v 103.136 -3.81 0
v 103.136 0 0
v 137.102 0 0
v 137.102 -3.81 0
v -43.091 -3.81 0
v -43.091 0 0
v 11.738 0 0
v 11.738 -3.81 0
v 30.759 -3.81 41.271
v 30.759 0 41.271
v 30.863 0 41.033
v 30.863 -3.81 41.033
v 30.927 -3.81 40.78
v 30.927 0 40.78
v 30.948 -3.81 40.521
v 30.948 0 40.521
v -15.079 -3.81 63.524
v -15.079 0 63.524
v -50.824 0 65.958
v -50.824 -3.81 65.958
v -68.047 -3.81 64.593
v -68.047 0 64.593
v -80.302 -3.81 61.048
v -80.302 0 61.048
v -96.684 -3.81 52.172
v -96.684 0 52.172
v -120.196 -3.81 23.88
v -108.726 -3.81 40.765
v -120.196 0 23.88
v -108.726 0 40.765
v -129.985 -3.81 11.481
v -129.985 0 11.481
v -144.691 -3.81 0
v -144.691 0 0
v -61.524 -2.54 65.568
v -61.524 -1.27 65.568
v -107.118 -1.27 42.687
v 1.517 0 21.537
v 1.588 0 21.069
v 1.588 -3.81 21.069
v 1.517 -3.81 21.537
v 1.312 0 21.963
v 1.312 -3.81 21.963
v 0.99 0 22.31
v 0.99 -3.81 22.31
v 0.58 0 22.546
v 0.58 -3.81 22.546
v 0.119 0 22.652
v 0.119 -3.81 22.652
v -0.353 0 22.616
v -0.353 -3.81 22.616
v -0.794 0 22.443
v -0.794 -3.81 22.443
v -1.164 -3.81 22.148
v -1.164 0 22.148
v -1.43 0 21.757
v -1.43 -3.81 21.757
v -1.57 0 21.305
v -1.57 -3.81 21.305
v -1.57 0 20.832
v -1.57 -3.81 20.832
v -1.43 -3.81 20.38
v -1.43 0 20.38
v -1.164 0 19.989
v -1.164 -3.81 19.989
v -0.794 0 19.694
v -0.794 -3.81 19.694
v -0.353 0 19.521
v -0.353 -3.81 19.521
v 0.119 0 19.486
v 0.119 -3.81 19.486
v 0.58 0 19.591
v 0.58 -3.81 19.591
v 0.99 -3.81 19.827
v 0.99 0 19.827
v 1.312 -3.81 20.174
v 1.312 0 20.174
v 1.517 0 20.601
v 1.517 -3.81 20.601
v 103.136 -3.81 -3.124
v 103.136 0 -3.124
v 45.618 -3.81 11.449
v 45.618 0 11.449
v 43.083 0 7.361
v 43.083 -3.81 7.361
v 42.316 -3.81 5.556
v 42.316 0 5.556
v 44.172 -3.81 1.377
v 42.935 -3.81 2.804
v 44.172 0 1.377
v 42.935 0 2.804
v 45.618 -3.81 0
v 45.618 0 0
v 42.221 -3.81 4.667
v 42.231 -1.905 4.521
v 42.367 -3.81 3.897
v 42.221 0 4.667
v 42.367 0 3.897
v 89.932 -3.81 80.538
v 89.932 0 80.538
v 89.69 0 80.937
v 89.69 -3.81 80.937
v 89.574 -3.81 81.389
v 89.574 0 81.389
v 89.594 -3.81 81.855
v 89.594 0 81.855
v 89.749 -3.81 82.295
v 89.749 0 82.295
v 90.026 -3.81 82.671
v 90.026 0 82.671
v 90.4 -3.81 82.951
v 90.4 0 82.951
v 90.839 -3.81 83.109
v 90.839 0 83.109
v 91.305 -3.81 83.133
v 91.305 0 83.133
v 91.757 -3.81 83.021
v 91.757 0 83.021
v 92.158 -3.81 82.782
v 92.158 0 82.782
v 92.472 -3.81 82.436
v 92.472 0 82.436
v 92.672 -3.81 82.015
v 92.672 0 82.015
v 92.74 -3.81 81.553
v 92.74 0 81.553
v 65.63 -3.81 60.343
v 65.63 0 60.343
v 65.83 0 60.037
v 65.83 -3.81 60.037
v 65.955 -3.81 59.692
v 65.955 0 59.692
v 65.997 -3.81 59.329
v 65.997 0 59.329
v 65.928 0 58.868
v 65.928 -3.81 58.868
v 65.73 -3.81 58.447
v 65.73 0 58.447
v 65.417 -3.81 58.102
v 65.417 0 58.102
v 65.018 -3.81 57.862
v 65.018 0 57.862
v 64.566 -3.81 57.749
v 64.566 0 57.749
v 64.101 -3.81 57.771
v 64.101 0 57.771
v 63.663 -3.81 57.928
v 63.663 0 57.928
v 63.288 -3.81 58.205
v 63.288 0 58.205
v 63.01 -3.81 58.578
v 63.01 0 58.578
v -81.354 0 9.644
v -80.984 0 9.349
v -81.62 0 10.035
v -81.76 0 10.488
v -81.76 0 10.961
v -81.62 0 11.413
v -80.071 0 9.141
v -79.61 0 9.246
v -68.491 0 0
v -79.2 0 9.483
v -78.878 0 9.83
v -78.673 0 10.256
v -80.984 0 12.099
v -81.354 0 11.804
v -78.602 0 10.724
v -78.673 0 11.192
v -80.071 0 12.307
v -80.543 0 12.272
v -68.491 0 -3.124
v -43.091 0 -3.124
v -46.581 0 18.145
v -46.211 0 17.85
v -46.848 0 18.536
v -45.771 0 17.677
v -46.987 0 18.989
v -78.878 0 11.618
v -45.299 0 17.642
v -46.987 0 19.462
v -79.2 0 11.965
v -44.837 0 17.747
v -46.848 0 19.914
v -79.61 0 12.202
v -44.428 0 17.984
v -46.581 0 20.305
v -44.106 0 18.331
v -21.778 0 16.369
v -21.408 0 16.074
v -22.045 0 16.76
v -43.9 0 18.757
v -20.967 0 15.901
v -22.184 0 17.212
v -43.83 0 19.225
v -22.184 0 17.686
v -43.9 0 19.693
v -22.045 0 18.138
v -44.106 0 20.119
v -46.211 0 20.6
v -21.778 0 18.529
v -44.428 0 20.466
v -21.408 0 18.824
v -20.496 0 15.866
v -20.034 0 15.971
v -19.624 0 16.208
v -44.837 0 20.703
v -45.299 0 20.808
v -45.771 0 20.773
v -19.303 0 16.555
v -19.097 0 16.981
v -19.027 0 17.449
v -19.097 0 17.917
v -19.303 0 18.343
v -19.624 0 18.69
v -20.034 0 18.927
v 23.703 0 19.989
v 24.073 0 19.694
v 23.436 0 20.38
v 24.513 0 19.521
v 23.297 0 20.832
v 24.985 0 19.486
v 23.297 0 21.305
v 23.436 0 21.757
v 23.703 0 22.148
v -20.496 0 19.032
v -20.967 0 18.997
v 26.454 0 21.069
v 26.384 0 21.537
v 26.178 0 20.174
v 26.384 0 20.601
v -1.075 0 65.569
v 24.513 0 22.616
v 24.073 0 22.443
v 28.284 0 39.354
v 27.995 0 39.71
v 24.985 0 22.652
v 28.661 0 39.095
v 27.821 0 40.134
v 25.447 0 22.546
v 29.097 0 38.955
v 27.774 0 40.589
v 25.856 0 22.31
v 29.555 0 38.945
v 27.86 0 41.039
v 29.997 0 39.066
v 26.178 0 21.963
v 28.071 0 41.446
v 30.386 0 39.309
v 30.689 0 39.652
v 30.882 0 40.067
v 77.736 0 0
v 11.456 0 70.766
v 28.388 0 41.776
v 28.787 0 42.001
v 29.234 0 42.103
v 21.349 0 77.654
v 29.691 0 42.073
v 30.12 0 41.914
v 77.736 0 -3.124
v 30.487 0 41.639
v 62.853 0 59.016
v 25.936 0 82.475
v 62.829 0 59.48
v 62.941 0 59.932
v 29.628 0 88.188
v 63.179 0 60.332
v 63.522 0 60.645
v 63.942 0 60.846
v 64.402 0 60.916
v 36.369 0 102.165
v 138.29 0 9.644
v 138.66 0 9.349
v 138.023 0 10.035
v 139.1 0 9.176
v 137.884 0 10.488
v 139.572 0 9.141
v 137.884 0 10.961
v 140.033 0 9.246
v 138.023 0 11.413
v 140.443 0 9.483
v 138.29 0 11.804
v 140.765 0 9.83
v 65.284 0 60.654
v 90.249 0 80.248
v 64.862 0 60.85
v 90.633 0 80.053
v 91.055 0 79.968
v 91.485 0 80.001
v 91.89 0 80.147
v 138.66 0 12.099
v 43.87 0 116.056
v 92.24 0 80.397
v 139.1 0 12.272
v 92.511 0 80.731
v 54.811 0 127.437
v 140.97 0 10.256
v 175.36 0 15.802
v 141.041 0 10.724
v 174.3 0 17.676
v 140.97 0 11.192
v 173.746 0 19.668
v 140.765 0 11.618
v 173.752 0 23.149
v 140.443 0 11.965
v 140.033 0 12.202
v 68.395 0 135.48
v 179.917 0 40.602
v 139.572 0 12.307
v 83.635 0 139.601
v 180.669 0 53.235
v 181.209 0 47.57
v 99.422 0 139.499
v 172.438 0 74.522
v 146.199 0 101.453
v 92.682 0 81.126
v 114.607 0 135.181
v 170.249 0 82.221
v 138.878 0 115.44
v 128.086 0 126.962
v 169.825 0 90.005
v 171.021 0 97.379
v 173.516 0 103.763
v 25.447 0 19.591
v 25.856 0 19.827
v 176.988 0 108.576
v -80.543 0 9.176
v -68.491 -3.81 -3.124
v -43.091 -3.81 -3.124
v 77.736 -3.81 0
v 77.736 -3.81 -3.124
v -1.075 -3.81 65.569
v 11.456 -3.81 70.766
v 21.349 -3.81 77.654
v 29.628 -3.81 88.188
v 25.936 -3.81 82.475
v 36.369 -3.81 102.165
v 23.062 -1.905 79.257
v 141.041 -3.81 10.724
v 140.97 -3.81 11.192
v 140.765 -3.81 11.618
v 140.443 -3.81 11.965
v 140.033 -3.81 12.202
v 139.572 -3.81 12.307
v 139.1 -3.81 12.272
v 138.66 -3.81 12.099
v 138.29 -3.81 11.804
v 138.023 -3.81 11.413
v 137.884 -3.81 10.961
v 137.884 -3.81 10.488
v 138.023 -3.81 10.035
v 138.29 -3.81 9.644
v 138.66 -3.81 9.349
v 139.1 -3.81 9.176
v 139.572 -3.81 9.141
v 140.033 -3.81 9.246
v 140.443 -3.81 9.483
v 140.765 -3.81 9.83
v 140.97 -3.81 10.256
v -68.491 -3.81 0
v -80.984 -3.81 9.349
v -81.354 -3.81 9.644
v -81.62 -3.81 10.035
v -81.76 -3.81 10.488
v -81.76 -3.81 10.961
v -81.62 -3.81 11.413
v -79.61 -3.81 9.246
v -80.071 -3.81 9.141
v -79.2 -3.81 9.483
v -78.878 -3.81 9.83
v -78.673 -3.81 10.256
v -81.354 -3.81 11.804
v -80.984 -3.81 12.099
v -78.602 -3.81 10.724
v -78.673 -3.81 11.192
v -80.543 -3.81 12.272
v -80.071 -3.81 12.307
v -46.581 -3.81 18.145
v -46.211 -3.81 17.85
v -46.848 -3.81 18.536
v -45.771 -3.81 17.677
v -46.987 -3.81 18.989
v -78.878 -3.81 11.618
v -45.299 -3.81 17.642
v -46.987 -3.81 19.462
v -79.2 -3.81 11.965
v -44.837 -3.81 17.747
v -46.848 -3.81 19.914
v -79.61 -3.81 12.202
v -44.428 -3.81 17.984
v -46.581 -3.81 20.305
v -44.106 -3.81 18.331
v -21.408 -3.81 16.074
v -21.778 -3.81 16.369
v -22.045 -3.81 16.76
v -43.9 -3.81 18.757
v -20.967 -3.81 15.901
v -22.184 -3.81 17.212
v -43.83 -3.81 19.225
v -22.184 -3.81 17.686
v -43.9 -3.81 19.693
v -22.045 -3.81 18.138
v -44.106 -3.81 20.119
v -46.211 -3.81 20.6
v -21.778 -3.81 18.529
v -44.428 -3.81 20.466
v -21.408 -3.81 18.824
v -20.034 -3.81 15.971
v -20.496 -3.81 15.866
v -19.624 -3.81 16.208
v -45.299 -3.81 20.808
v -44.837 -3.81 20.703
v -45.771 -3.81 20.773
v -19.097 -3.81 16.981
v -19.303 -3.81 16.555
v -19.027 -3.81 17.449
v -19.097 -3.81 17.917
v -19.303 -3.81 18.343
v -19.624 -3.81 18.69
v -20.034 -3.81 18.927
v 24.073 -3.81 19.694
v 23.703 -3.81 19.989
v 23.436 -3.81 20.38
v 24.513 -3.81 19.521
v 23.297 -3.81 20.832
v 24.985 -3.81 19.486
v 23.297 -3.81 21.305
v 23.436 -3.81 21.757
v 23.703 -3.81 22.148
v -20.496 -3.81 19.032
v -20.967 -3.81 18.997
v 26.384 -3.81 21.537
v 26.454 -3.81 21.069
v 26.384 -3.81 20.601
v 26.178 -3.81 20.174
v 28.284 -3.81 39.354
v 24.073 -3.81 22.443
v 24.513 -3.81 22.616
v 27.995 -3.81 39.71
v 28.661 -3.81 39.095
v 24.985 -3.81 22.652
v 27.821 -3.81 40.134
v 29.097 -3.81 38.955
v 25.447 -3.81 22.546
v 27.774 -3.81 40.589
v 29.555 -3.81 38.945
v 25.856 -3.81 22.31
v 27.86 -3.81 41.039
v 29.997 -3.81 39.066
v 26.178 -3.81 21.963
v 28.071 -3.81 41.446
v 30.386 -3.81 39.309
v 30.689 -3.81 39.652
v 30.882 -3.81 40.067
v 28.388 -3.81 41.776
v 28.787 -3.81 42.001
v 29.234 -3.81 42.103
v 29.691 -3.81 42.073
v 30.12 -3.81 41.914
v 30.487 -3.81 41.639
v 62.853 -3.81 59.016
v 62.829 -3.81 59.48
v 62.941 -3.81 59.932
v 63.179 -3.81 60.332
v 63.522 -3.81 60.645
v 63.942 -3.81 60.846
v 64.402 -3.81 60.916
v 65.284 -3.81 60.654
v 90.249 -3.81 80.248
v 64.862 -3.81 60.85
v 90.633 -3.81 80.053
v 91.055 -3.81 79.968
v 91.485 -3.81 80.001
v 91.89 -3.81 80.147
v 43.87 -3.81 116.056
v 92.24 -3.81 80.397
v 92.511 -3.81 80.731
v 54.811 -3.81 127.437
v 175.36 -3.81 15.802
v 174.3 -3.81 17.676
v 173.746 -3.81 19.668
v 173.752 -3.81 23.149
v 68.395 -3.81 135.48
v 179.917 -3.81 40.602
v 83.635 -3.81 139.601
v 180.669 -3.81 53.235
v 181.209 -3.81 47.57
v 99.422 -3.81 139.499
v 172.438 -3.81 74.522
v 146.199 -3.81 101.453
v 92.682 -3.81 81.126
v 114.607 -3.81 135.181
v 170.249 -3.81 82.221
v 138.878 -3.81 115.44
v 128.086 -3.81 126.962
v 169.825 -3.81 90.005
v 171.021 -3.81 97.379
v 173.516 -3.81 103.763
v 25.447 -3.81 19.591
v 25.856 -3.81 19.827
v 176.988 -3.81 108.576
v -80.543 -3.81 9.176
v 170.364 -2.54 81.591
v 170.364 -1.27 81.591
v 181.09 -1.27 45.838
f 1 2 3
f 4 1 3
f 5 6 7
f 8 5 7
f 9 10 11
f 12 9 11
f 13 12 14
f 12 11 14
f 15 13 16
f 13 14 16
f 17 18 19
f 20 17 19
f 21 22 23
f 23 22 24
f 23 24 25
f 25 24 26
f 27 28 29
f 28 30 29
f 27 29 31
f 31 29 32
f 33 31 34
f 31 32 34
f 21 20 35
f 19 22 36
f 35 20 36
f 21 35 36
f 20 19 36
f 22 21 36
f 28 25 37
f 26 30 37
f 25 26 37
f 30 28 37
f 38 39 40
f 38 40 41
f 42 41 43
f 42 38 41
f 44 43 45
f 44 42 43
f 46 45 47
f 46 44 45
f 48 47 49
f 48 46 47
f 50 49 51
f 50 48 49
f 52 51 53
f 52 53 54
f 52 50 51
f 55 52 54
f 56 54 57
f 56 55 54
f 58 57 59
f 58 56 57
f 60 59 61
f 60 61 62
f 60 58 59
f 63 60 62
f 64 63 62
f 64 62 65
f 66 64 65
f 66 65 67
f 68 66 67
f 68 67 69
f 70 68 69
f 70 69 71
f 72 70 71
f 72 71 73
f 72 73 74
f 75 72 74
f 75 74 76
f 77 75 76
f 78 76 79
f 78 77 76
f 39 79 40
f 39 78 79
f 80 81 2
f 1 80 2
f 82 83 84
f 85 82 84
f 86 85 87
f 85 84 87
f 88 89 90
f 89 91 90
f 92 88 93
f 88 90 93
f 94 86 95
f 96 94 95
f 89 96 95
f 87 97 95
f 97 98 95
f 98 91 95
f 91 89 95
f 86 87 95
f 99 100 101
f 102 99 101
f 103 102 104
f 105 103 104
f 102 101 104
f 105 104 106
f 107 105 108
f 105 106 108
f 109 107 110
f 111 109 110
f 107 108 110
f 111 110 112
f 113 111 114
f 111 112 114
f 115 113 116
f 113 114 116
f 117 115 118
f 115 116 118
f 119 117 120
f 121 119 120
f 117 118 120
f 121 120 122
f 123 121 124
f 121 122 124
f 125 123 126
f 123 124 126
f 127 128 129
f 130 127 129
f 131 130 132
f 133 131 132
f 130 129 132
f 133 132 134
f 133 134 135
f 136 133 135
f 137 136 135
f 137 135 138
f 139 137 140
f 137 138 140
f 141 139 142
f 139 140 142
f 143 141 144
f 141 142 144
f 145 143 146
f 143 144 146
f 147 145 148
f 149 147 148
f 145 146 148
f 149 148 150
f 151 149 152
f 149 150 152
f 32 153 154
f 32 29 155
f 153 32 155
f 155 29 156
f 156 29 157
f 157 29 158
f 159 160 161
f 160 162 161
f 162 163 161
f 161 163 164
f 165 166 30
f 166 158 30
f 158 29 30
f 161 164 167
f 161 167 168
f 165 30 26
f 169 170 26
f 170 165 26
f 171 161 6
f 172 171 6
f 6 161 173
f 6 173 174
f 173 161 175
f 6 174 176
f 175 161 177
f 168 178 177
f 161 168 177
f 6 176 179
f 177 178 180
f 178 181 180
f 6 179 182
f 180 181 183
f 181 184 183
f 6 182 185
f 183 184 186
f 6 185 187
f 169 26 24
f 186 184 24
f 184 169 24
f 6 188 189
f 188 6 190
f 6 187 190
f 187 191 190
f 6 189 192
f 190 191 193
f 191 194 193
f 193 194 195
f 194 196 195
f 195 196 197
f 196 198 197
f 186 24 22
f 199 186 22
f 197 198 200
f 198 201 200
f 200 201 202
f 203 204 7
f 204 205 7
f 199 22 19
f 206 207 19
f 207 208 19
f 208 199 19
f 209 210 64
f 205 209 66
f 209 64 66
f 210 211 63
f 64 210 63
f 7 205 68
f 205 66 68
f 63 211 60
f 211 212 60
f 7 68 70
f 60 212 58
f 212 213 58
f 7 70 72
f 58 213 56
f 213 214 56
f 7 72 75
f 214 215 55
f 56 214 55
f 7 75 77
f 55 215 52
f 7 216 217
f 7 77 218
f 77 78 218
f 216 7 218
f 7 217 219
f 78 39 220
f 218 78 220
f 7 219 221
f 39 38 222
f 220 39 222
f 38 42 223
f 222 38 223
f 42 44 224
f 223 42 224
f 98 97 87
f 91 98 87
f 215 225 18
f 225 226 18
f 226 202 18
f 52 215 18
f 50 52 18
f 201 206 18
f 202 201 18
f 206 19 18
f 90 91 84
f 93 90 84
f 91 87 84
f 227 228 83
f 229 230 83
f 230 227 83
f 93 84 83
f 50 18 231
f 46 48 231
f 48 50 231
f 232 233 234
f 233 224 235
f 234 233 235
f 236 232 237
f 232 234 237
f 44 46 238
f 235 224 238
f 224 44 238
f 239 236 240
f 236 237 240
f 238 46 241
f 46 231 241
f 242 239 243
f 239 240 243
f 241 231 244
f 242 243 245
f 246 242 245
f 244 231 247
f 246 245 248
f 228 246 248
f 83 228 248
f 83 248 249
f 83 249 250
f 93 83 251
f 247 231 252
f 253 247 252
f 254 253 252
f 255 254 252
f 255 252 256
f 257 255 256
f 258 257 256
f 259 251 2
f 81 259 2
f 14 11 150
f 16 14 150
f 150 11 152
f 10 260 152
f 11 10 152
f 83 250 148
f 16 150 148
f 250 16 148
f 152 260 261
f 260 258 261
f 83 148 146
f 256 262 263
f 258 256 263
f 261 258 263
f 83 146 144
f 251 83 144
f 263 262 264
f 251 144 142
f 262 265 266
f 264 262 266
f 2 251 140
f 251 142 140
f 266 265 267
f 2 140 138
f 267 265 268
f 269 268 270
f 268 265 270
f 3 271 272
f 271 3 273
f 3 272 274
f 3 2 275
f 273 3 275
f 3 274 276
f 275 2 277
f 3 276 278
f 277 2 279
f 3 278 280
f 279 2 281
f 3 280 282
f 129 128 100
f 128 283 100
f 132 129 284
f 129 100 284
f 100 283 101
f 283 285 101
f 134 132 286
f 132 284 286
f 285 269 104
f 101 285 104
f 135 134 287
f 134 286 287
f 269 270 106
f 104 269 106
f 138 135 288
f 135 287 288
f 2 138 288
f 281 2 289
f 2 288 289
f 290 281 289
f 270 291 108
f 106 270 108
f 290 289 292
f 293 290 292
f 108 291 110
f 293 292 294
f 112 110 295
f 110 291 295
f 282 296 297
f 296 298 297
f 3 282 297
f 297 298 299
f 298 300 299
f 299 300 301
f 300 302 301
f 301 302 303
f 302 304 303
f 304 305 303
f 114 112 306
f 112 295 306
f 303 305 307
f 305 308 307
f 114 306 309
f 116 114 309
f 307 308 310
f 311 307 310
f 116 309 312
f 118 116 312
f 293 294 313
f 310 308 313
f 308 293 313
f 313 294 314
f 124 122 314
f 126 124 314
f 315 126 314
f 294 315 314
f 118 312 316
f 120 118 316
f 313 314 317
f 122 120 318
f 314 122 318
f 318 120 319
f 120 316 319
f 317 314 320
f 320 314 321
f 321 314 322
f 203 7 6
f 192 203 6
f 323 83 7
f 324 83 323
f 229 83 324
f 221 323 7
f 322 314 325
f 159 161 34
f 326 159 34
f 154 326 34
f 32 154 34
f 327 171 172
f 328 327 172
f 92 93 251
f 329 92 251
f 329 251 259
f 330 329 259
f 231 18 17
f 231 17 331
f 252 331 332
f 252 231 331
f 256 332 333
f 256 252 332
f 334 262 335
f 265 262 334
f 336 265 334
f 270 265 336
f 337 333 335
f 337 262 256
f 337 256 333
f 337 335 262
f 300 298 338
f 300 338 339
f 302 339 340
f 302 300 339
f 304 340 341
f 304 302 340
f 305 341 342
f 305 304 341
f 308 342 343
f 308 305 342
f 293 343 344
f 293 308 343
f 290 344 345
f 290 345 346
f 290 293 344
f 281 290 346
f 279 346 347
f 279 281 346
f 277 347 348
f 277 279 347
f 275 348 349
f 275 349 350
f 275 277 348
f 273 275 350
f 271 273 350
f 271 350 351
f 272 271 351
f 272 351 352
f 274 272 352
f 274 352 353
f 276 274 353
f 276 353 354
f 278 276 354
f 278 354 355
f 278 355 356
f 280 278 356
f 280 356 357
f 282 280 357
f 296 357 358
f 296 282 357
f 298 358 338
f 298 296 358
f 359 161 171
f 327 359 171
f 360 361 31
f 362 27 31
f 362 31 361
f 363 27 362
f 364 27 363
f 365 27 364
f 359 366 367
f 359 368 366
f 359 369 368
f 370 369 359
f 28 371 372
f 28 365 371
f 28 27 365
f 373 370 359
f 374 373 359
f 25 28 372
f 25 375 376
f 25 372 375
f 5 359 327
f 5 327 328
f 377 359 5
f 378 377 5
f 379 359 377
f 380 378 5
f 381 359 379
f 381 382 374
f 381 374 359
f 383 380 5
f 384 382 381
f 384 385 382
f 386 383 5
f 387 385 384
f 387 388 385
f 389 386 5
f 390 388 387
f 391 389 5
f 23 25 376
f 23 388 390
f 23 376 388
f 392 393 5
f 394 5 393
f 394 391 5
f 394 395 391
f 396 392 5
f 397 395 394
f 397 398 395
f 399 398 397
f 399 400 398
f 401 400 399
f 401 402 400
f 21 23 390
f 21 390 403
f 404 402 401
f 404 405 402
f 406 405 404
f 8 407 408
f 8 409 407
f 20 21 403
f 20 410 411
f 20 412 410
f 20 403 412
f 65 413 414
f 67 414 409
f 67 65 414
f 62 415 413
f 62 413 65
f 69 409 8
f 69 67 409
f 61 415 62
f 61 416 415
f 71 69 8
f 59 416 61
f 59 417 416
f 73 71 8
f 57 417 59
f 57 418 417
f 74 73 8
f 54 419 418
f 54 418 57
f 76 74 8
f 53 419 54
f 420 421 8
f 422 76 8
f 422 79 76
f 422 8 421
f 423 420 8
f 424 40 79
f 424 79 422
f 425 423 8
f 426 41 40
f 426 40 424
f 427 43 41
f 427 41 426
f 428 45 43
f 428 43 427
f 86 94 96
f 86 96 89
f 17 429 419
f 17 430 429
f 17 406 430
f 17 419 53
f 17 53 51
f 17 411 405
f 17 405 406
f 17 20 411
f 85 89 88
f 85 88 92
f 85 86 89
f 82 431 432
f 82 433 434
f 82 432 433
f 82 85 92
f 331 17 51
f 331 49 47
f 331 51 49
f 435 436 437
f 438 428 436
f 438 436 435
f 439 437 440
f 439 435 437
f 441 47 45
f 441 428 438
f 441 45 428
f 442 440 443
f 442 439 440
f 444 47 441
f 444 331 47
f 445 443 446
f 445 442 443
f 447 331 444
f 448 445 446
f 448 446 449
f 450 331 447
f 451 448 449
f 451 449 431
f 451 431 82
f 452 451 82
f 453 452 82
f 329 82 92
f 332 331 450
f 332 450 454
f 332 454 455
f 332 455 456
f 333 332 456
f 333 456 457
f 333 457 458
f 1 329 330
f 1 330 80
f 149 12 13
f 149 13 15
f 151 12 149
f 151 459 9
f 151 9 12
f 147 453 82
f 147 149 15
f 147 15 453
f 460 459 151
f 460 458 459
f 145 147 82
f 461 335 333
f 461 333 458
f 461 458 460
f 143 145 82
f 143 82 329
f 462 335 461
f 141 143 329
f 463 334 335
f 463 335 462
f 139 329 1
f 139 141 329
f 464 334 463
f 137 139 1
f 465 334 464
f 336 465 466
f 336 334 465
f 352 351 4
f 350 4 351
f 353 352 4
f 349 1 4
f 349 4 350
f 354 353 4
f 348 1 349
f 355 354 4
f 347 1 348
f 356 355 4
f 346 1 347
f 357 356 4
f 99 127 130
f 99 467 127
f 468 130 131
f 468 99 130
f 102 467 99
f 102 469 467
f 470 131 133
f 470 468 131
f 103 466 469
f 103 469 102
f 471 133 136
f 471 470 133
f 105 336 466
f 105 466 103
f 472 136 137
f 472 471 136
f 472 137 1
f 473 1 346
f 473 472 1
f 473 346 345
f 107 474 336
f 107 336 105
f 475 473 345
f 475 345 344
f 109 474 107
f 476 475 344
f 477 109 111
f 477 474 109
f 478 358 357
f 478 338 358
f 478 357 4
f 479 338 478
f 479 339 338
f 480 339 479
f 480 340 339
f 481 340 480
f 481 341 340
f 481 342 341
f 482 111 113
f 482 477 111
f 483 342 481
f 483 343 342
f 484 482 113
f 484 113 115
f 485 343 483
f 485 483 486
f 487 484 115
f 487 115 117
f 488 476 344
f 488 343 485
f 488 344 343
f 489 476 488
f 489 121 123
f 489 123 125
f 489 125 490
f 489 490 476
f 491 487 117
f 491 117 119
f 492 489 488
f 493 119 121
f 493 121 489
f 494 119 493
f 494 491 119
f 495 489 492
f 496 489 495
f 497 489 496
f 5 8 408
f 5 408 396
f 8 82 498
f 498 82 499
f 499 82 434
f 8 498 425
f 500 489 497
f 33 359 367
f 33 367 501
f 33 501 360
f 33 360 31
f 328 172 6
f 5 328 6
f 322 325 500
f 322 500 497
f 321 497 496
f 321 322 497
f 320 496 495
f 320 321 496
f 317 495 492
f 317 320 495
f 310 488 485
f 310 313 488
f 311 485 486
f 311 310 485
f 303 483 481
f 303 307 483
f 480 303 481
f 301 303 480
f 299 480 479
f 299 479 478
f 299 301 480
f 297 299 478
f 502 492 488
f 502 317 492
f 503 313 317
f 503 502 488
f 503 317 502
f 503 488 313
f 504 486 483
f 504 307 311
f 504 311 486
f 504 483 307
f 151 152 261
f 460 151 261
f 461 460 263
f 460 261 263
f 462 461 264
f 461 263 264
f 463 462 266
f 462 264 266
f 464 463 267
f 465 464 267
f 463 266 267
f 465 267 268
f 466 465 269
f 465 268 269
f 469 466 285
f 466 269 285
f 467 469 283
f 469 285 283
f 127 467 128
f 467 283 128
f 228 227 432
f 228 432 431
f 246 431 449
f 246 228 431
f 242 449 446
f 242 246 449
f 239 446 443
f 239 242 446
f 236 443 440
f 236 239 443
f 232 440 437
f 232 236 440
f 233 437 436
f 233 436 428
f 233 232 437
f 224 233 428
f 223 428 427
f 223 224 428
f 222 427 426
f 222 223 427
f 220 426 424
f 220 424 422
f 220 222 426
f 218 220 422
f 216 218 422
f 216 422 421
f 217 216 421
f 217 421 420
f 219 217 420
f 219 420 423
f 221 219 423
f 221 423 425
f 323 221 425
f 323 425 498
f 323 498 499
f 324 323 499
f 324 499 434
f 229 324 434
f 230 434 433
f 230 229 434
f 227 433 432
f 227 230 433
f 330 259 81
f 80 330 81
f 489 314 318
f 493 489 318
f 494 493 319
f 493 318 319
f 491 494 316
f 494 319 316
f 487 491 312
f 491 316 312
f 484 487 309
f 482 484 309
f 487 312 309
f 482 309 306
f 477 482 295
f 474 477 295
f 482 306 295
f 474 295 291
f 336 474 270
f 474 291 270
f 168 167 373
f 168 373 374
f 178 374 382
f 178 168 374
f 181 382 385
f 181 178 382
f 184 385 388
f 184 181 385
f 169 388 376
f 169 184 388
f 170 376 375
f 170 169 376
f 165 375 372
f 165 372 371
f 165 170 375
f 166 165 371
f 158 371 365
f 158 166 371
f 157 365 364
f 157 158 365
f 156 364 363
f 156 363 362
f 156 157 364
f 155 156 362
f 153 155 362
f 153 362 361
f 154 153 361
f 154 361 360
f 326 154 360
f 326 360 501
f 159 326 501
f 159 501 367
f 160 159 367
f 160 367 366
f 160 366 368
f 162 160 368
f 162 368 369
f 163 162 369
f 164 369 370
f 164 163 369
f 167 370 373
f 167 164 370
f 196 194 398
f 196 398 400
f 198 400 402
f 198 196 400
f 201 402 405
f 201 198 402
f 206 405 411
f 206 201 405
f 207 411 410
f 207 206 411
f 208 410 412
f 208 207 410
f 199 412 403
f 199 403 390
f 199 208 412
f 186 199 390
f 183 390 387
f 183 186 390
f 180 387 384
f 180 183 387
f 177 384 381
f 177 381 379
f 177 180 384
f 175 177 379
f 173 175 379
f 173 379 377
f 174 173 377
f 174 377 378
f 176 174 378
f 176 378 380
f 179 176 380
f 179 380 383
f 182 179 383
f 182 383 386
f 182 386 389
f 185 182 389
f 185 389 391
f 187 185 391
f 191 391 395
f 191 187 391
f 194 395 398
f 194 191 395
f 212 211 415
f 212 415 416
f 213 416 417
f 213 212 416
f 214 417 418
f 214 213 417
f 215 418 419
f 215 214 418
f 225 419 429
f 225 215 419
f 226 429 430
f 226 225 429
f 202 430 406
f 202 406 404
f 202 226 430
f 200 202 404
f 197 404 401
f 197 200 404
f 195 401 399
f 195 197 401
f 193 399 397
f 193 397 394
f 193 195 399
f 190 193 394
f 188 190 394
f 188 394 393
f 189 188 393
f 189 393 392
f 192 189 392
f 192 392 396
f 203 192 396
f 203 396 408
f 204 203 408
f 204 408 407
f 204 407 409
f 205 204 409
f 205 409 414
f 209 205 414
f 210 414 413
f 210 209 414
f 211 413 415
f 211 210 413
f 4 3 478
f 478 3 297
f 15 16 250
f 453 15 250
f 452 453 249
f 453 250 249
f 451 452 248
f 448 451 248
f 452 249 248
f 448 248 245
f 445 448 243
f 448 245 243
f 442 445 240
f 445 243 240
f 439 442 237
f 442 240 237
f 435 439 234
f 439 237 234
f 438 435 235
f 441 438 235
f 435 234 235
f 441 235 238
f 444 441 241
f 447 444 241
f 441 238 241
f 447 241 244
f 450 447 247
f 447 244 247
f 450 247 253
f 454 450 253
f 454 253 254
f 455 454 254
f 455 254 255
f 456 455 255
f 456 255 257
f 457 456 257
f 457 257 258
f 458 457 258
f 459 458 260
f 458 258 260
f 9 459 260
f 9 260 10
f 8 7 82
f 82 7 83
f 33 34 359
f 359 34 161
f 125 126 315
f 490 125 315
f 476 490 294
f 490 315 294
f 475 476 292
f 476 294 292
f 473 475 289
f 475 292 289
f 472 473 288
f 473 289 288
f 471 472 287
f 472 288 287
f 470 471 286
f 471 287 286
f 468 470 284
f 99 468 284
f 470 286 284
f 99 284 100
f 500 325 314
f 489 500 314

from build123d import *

# Parameters (mm, degrees)
F0_R     = 1.5875
F1_DEPTH = 3.81


with BuildPart() as f1:
    # F0 (on Front) → F1 (new body)
    with BuildSketch(Plane.XZ):
        with BuildLine():
            Line((-43.090851702, -3.1242), (-43.090851702, 0))
            Line((-43.090851702, 0), (11.7375096306, 0))
            Line((11.7375096306, 0), (45.617762953, 11.4486236125))
            add(Edge.make_bspline(
                [(45.617762953, 11.4486236125), (43.9961000977, 8.6191003913), (40.3730056188, 4.577922731), (44.1195508196, 1.4224311064), (45.617762953, 0)],
                knots=[0, 0, 0, 0, 0.5388146408, 1, 1, 1, 1], degree=3))
            Line((45.617762953, 0), (77.7362398488, 0))
            Line((77.7362398488, 0), (77.7362398488, -3.1242))
            Line((77.7362398488, -3.1242), (103.1362398488, -3.1242))
            Line((103.1362398488, -3.1242), (103.1362398488, 0))
            Line((103.1362398488, 0), (137.1024620031, 0))
            Line((137.1024620031, 0), (175.3601329191, 15.8024989069))
            add(Edge.make_bspline(
                [(176.9877400097, 108.5755596732), (171.7473141945, 103.3597046798), (164.3550587217, 79.2093285896), (191.2164116111, 47.498469968), (169.6077040725, 23.5923640125), (175.3601329191, 15.8024989069)],
                knots=[0, 0, 0, 0, 0.3117132351, 0.6730053796, 1, 1, 1, 1], degree=3))
            Line((176.9877400097, 108.5755596732), (146.1987151904, 101.452911742))
            ThreePointArc((146.1987151904, 101.452911742), (91.5320388396, 140.0844195098), (36.3692378486, 102.1647111449))
            add(Edge.make_bspline(
                [(-15.078710516, 63.5241562685), (0.3297940237, 63.5041378405), (27.1279570327, 77.8387740817), (31.1426373051, 91.6452955028), (36.3692378486, 102.1647111449)],
                knots=[0, 0, 0, 0, 0.5551499724, 1, 1, 1, 1], degree=3))
            add(Edge.make_bspline(
                [(-15.078710516, 63.5241562685), (-30.8021855302, 63.8675037628), (-65.4962545936, 70.9878737096), (-114.1797542997, 45.7754396965), (-122.9711554478, 12.7121701485), (-144.690851702, 0)],
                knots=[0.2992076009, 0.2992076009, 0.2992076009, 0.2992076009, 0.50107299, 0.7437623527, 1, 1, 1, 1], degree=3))
            Line((-144.690851702, 0), (-68.490851702, 0))
            Line((-68.490851702, 0), (-68.490851702, -3.1242))
            Line((-68.490851702, -3.1242), (-43.090851702, -3.1242))
        make_face()
        with Locations((-80.1899433136, 10.7241785154)):
            Circle(F0_R, mode=Mode.SUBTRACT)
        with Locations((-45.4173433136, 19.2251093046)):
            Circle(F0_R, mode=Mode.SUBTRACT)
        with Locations((-20.6142470102, 17.4490999235)):
            Circle(F0_R, mode=Mode.SUBTRACT)
        with Locations((0, 21.0686270148)):
            Circle(F0_R, mode=Mode.SUBTRACT)
        with Locations((24.8666, 21.0686270148)):
            Circle(F0_R, mode=Mode.SUBTRACT)
        with Locations((139.4535154104, 10.7241785154)):
            Circle(F0_R, mode=Mode.SUBTRACT)
        with BuildLine():
            ThreePointArc((30.7592003997, 41.2713398651), (30.8999876678, 40.90769576), (30.9478799796, 40.5207016819))
            ThreePointArc((30.9478799796, 40.5207016819), (27.8207722914, 40.1337076037), (30.7592003997, 41.2713398651))
        make_face(mode=Mode.SUBTRACT)
        with BuildLine():
            ThreePointArc((65.9967244268, 59.3286920018), (64.796218505, 57.7890843136), (63.0104040067, 58.5780538185))
            ThreePointArc((63.0104040067, 58.5780538185), (63.5221237134, 60.6452057975), (65.6301646769, 60.3433156541))
            ThreePointArc((65.6301646769, 60.3433156541), (65.9022748106, 59.8680961189), (65.9967244268, 59.3286920018))
        make_face(mode=Mode.SUBTRACT)
        with BuildLine():
            ThreePointArc((92.7401996638, 81.553008482), (91.6921037808, 80.0599580982), (89.9317594137, 80.5383848296))
            ThreePointArc((89.9317594137, 80.5383848296), (90.6132955467, 83.0460588657), (92.7401996638, 81.553008482))
        make_face(mode=Mode.SUBTRACT)
    extrude(amount=F1_DEPTH)


solid = f1.part
